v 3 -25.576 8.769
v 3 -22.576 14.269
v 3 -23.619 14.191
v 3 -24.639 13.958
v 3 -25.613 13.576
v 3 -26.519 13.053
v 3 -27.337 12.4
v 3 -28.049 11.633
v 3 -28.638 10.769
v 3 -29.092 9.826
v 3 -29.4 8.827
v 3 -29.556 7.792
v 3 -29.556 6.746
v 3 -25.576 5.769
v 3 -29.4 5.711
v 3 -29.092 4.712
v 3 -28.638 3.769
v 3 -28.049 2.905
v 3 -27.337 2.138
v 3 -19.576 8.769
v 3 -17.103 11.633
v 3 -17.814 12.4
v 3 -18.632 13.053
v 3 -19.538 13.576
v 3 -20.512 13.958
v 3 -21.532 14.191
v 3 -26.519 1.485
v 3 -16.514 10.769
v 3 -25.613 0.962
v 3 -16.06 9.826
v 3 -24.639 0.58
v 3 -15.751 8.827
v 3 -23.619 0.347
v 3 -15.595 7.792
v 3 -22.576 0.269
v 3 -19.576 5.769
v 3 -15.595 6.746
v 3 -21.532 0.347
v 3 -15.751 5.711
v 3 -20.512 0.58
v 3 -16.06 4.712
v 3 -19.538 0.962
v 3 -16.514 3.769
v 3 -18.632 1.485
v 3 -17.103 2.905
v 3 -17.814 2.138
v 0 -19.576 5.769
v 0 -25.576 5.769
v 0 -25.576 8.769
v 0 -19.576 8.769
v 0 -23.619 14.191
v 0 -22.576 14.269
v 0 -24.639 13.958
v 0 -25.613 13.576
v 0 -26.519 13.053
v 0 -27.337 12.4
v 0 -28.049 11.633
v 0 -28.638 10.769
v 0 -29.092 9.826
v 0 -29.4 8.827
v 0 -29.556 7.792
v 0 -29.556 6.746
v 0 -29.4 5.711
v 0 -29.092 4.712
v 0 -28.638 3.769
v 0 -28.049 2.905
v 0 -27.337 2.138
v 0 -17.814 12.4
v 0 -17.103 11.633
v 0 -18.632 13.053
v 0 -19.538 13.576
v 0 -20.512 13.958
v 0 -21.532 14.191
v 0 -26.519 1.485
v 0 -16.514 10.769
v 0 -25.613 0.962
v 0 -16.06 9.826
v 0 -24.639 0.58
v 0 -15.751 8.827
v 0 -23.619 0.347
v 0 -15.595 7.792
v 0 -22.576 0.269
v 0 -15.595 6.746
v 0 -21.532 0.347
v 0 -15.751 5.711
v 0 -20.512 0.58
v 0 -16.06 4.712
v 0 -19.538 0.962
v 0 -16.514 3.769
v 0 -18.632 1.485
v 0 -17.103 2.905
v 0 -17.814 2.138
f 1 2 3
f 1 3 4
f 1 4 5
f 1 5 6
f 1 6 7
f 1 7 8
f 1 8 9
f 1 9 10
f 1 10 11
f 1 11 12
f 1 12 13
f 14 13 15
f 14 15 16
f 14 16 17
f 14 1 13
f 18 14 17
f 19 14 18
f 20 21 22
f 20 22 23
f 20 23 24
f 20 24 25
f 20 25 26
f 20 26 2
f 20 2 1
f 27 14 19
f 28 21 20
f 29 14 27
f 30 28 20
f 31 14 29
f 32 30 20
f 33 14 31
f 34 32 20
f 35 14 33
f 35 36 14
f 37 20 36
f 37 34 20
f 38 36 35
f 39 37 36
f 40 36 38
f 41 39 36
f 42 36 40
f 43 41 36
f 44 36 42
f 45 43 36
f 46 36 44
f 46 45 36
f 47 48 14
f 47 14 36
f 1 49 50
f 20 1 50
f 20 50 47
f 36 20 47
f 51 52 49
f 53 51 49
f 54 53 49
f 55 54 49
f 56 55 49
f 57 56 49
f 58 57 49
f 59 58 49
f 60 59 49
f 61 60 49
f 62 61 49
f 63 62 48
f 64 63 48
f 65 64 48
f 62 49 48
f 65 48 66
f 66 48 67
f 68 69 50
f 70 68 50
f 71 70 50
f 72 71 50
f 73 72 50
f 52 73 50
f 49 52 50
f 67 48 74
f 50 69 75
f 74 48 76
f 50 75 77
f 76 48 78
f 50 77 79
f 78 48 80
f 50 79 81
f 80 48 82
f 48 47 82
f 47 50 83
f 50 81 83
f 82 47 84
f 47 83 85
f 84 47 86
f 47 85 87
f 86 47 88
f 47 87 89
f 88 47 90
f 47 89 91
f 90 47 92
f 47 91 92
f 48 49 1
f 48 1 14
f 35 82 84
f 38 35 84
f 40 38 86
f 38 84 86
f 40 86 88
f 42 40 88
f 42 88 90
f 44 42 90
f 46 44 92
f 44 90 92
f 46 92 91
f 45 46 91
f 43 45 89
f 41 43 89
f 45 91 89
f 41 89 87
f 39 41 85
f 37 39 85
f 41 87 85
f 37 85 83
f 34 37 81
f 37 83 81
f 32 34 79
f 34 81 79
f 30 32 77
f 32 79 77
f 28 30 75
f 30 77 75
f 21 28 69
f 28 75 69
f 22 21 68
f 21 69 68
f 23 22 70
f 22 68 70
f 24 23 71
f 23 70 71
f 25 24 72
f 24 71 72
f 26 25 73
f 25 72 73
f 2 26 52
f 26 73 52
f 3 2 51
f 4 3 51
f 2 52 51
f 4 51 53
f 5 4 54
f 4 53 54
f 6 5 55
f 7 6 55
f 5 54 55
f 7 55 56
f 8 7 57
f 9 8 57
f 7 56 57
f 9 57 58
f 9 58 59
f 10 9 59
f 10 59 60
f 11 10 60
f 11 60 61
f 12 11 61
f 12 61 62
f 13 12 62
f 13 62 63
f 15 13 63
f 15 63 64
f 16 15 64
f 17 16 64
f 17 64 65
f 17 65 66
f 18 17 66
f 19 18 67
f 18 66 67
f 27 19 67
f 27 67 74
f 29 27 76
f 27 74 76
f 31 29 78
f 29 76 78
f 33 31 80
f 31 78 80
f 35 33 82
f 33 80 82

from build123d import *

# Parameters (mm, degrees)
SKETCH1_R           = 7
SKETCH1_W           = 3
SKETCH1_H           = 6
BOSS_EXTRUDE1_DEPTH = 3


with BuildPart() as part:
    # Sketch1 → Boss-Extrude1 (new body)
    with BuildSketch(Plane(origin=(0, 0, 0), x_dir=(0, 0, -1), z_dir=(1, 0, 0))):
        with Locations((-7.268981817, -22.575682471)):
            Circle(SKETCH1_R)
        with Locations((-7.268981817, -22.575682471)):
            Rectangle(SKETCH1_W, SKETCH1_H, mode=Mode.SUBTRACT)
    extrude(amount=BOSS_EXTRUDE1_DEPTH)


solid = part.part
